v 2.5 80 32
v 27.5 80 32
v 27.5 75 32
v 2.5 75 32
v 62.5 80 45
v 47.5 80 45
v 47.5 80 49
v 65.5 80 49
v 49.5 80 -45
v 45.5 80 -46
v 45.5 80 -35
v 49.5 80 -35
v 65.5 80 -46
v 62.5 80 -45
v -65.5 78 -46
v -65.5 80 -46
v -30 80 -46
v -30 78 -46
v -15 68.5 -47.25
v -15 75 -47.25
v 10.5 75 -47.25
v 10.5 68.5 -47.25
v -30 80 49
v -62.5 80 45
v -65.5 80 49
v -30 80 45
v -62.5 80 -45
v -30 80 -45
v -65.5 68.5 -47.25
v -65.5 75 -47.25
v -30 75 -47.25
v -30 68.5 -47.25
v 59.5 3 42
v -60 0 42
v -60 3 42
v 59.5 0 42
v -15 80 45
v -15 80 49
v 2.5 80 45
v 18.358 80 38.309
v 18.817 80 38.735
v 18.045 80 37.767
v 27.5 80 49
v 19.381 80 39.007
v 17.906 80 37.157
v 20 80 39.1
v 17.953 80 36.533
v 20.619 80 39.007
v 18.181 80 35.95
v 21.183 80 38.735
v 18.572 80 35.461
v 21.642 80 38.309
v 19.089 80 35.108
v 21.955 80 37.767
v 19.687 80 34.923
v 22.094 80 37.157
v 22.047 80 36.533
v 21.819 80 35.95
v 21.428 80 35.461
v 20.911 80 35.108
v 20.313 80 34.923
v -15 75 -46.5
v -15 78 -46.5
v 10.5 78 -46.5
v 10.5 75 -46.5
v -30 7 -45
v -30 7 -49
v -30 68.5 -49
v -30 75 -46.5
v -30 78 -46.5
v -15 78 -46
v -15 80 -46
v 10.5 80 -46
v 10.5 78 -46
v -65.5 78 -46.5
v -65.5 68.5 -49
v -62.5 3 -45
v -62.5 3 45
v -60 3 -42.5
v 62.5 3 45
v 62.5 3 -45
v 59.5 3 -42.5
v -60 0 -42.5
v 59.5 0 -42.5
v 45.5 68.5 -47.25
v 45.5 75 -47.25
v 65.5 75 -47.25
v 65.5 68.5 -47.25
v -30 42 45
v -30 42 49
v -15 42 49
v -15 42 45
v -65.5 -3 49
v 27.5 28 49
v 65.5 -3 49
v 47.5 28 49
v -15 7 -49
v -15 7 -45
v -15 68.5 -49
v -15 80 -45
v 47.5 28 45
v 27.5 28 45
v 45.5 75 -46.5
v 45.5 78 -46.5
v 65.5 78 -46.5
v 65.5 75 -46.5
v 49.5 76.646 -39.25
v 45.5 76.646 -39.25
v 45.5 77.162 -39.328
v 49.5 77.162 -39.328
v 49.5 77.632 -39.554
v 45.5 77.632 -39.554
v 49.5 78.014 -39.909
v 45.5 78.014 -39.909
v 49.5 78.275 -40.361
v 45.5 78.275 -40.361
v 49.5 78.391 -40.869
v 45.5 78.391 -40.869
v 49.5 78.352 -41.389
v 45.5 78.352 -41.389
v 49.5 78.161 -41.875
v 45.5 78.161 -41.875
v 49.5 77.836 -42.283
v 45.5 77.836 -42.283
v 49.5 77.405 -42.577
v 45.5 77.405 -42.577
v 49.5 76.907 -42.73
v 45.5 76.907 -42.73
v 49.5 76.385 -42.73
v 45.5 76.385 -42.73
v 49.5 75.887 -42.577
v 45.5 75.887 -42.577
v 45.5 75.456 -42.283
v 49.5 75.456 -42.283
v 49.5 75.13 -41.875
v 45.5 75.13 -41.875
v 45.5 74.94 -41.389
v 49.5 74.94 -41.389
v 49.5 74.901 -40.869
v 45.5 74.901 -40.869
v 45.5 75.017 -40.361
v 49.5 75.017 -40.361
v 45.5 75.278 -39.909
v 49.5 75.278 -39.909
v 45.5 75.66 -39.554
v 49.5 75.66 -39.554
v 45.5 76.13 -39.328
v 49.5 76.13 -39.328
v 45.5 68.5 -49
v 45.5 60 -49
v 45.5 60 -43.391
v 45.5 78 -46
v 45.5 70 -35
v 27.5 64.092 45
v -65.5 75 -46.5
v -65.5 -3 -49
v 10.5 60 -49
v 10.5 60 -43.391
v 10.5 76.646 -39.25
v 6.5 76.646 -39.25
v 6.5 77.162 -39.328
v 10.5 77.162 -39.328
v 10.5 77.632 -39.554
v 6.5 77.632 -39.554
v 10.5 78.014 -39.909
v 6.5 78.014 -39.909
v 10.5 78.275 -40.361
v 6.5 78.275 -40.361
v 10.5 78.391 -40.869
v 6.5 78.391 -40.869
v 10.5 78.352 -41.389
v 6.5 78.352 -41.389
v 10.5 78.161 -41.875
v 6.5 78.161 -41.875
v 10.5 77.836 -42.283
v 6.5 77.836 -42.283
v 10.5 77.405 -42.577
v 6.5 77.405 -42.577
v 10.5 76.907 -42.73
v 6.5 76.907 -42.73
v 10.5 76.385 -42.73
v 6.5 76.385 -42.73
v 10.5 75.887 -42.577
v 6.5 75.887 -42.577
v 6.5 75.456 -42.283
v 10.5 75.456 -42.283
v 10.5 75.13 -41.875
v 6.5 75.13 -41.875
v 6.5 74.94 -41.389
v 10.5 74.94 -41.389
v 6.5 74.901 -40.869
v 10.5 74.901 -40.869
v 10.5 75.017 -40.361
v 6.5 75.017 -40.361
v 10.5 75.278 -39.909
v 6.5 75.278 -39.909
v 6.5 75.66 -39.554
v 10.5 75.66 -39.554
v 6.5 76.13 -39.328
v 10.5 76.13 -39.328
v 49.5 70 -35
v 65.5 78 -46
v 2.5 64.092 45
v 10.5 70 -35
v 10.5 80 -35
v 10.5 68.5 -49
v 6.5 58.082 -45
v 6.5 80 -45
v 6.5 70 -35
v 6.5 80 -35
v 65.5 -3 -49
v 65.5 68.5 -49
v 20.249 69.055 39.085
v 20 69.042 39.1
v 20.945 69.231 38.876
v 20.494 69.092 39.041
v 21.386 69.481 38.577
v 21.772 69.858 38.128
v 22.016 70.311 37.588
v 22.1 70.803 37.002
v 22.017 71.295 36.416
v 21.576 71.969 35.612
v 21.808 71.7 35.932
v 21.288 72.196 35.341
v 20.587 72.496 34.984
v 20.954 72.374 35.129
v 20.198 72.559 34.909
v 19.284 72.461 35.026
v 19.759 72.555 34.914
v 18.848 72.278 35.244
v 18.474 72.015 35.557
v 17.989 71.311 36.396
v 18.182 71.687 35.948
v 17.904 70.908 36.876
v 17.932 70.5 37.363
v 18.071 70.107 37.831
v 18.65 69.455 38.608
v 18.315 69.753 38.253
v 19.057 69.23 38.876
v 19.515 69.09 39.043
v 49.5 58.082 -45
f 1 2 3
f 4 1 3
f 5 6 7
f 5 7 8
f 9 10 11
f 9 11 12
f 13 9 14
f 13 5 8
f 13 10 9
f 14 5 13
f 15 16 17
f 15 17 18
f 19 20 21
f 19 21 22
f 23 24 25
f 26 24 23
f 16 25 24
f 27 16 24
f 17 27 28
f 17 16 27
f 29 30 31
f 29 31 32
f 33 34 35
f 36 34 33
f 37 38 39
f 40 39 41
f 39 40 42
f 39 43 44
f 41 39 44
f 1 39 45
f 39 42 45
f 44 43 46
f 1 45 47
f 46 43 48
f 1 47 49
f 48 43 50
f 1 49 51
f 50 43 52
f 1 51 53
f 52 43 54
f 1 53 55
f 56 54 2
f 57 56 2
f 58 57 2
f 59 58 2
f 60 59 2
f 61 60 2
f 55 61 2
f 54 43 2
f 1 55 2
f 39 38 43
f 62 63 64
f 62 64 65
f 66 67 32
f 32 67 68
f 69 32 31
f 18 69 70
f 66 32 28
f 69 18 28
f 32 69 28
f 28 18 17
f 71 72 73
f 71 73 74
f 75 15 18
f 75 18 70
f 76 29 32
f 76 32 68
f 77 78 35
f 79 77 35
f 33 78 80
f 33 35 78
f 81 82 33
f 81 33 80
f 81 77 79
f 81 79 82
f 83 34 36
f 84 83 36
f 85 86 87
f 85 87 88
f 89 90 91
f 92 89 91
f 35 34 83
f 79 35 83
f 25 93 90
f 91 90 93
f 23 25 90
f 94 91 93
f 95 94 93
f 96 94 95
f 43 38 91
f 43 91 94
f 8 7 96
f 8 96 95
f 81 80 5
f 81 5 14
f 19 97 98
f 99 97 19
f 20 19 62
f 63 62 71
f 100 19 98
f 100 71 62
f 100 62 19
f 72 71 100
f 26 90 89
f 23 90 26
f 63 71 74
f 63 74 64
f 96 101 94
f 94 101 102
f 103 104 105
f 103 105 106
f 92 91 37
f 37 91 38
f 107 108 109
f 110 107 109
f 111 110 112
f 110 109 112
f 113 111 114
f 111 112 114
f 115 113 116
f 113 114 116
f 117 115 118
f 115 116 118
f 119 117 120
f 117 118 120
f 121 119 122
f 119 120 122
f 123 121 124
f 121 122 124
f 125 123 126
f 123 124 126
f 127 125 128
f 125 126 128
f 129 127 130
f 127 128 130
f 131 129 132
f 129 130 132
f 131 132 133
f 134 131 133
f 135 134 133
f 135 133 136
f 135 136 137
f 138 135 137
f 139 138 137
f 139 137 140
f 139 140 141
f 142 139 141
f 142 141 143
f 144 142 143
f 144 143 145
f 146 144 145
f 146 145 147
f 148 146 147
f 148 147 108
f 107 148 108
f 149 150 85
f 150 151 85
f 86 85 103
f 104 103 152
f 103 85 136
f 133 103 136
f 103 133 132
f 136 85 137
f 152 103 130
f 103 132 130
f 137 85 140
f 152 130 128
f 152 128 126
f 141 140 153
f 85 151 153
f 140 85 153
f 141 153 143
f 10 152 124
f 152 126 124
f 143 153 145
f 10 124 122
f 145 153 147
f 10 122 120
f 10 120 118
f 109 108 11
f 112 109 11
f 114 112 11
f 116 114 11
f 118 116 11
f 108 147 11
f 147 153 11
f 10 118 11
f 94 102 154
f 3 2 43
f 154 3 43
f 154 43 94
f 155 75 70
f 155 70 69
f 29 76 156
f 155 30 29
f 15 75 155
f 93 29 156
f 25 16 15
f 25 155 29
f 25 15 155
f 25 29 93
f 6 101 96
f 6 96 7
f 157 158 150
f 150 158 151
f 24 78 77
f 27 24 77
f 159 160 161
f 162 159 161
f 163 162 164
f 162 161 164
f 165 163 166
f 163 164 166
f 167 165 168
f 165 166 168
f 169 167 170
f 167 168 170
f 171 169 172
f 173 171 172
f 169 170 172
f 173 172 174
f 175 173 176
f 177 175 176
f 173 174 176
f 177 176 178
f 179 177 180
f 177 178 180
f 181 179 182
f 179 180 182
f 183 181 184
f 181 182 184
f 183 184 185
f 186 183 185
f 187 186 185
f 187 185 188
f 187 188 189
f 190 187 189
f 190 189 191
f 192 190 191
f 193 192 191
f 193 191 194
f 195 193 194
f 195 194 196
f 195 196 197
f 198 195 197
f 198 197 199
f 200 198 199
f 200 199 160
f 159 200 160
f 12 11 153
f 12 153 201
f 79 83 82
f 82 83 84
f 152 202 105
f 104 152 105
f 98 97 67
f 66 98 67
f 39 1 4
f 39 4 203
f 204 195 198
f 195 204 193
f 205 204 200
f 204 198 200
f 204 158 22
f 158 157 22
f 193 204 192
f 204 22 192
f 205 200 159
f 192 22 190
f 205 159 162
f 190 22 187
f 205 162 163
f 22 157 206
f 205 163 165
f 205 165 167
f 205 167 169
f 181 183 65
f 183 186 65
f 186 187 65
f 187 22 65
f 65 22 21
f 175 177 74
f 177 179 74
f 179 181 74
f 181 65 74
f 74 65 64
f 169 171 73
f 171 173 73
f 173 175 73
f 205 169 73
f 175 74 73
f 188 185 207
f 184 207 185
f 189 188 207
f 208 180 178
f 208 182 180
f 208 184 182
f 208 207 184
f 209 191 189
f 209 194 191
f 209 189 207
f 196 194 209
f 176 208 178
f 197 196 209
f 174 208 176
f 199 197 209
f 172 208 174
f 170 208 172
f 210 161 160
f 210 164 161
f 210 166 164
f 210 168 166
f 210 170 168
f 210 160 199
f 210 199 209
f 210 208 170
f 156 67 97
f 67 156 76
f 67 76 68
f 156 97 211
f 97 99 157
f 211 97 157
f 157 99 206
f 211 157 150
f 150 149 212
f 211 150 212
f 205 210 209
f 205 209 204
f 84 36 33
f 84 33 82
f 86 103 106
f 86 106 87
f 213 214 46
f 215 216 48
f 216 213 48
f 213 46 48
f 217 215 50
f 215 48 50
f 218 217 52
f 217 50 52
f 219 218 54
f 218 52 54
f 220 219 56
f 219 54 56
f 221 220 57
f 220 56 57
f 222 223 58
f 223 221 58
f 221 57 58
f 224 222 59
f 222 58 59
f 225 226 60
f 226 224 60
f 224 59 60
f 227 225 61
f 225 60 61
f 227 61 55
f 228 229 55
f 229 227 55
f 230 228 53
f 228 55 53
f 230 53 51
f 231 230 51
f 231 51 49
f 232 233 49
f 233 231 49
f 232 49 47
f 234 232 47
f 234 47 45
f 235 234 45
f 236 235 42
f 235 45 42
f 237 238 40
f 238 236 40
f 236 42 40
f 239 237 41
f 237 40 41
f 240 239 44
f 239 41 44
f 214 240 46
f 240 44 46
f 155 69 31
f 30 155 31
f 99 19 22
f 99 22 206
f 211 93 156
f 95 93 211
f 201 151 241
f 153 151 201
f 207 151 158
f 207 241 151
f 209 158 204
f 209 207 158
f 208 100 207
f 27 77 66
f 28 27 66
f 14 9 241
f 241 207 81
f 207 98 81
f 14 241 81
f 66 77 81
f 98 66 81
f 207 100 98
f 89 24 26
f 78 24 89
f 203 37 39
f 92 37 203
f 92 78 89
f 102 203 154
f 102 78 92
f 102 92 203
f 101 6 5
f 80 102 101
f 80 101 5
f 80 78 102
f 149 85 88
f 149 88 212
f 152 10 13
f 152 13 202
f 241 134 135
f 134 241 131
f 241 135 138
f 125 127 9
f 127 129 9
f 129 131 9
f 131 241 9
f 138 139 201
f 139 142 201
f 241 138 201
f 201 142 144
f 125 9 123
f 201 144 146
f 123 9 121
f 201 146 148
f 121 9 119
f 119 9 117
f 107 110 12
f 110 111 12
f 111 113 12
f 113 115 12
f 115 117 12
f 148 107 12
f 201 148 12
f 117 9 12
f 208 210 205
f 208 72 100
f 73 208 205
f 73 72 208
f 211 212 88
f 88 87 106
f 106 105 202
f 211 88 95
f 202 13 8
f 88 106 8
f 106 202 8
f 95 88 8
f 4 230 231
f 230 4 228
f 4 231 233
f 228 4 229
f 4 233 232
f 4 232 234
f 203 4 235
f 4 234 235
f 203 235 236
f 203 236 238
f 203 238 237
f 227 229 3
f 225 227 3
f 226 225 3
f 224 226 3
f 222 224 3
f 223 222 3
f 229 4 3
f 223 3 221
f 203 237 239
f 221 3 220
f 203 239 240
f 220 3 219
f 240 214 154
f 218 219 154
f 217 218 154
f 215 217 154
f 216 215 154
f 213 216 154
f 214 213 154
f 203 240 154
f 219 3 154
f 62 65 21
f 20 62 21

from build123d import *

# Parameters (mm, degrees)
SKETCH1_W                       = 131
SKETCH1_H                       = 98
SKETCH1_W_2                     = 125
SKETCH1_H_2                     = 90
BOSS_EXTRUDE1_DEPTH             = 80
SKETCH2_W                       = 131
SKETCH2_H                       = 98
BOSS_EXTRUDE2_DEPTH             = 3
SKETCH4_W                       = 125
SKETCH4_H                       = 90
SKETCH4_W_2                     = 119.5
SKETCH4_H_2                     = 84.5
BOSS_EXTRUDE3_DEPTH             = 3
SKETCH5_W                       = 15
SKETCH5_H                       = 73
CABLE_CUT_TOP_DEPTH             = 4
CABLE_CUT_BOTTOM_RIGHT_REACH    = 141.736
SKETCH6_W                       = 20
SKETCH6_H                       = 52
SKETCH10_W                      = 15
SKETCH10_H                      = 38
CABLE_CUT_BOTTOM_LEFT_DEPTH     = 4
SCHANIER_CUT_REACH              = 141.736
SKETCH7_W                       = 35
SKETCH7_H                       = 20
SKETCH8_W                       = 4
SKETCH8_H                       = 10
SCHANIER_DEPTH                  = 10
F_3D_PRINTER_SUPPORT_DEPTH      = 43
SKIZZE3_W                       = 35
SKIZZE3_H                       = 10
SCHNITT_LINEAR_AUSTRAGEN1_DEPTH = 20
SCHNITT_LINEAR_AUSTRAGEN3_REACH = 120.258
SKIZZE5_R                       = 1.75
AUFSATZ_LINEAR_AUSTRAGEN2_DEPTH = 25
SCHNITT_LINEAR_AUSTRAGEN4_REACH = 118.534
SKIZZE10_R                      = 2.1
CUT_EXTRUDE4_REACH              = 163.127


with BuildPart() as part:
    # Sketch1 → Boss-Extrude1 (new body)
    with BuildSketch(Plane(origin=(0, 0, 0), x_dir=(1, 0, 0), z_dir=(0, 1, 0))):
        Rectangle(SKETCH1_W, SKETCH1_H)
        Rectangle(SKETCH1_W_2, SKETCH1_H_2, mode=Mode.SUBTRACT)
    extrude(amount=BOSS_EXTRUDE1_DEPTH)

    # Sketch2 → Boss-Extrude2 (add)
    with BuildSketch(Plane.XZ):
        Rectangle(SKETCH2_W, SKETCH2_H)
    extrude(amount=BOSS_EXTRUDE2_DEPTH)

    # Sketch4 → Boss-Extrude3 (add)
    with BuildSketch(Plane(origin=(0, 0, 0), x_dir=(1, 0, 0), z_dir=(0, 1, 0))):
        Rectangle(SKETCH4_W, SKETCH4_H)
        with Locations((-0.25, 0.25)):
            Rectangle(SKETCH4_W_2, SKETCH4_H_2, mode=Mode.SUBTRACT)
    extrude(amount=BOSS_EXTRUDE3_DEPTH)

    # Sketch5 → Cable Cut Top (cut)
    with BuildSketch(Plane(origin=(0, 0, -49), x_dir=(-1, 0, 0), z_dir=(0, 0, -1))):
        with Locations((22.5, 43.5)):
            Rectangle(SKETCH5_W, SKETCH5_H)
    extrude(amount=-CABLE_CUT_TOP_DEPTH, mode=Mode.SUBTRACT)

    # Sketch6 → Cable Cut Bottom Right (cut, up to next)
    with BuildSketch(Plane(origin=(0, 0, 45), x_dir=(-1, 0, 0), z_dir=(0, 0, -1)), mode=Mode.PRIVATE) as cable_cut_bottom_right_sk1:
        with Locations((-37.5, 54)):
            Rectangle(SKETCH6_W, SKETCH6_H)
    cable_cut_bottom_right_tool1 = extrude(cable_cut_bottom_right_sk1.sketch, amount=-CABLE_CUT_BOTTOM_RIGHT_REACH, mode=Mode.PRIVATE) & part.part
    add(cable_cut_bottom_right_tool1.solids().sort_by_distance((37.5, 54, 45))[0], mode=Mode.SUBTRACT)

    # Sketch10 → Cable Cut Bottom Left (cut)
    with BuildSketch(Plane.XY.offset(49)):
        with Locations((-22.5, 61)):
            Rectangle(SKETCH10_W, SKETCH10_H)
    extrude(amount=-CABLE_CUT_BOTTOM_LEFT_DEPTH, mode=Mode.SUBTRACT)

    # Sketch7 → Schanier Cut (cut, up to next)
    with BuildSketch(Plane.XY.offset(-45), mode=Mode.PRIVATE) as schanier_cut_sk1:
        with Locations((28, 70)):
            Rectangle(SKETCH7_W, SKETCH7_H)
    schanier_cut_tool1 = extrude(schanier_cut_sk1.sketch, amount=-SCHANIER_CUT_REACH, mode=Mode.PRIVATE) & part.part
    add(schanier_cut_tool1.solids().sort_by_distance((28, 70, -45))[0], mode=Mode.SUBTRACT)

    # Sketch8 → Schanier (add)
    with BuildSketch(Plane.XY.offset(-45)):
        with Locations((8.5, 75)):
            Rectangle(SKETCH8_W, SKETCH8_H)
        with Locations((47.5, 75)):
            Rectangle(SKETCH8_W, SKETCH8_H)
    extrude(amount=SCHANIER_DEPTH)

    # Skizze2 → 3D Printer Support (add)
    with BuildSketch(Plane.ZY.offset(-6.5)):
        Polygon((-35, 70), (-45, 70), (-45, 58.082464074), align=None)
    extrude(amount=-F_3D_PRINTER_SUPPORT_DEPTH)

    # Skizze3 → Schnitt-Linear austragen1 (cut)
    with BuildSketch(Plane(origin=(0, 0, -45), x_dir=(-1, 0, 0), z_dir=(0, 0, -1))):
        with Locations((-28, 65)):
            Rectangle(SKIZZE3_W, SKIZZE3_H)
    extrude(amount=-SCHNITT_LINEAR_AUSTRAGEN1_DEPTH, mode=Mode.SUBTRACT)

    # Schnitt-Linear austragen3: up to this face of the body (flat: up to its plane)
    schnitt_linear_austragen3_end = Plane(part.part.faces().sort_by_distance((49.5, 71.649796712, -40.622308687))[0])
    # Skizze5 → Schnitt-Linear austragen3 (cut, up to the picked face)
    with BuildSketch(Plane.ZY.offset(-6.5), mode=Mode.PRIVATE) as schnitt_linear_austragen3_sk1:
        with Locations((-41, 76.645898034)):
            Circle(SKIZZE5_R)
    schnitt_linear_austragen3_tool1 = split(extrude(schnitt_linear_austragen3_sk1.sketch, amount=-SCHNITT_LINEAR_AUSTRAGEN3_REACH, mode=Mode.PRIVATE), bisect_by=schnitt_linear_austragen3_end, keep=Keep.BOTH, mode=Mode.PRIVATE)
    add(schnitt_linear_austragen3_tool1.solids().sort_by(Axis((6.5, 76.645898, -41), (1, 0, 0)))[0], mode=Mode.SUBTRACT)

    # Skizze9 → Aufsatz-Linear austragen2 (add)
    with BuildSketch(Plane(origin=(27.5, 0, 0), x_dir=(0, 0, -1), z_dir=(1, 0, 0))):
        Polygon((-45, 80), (-32, 80), (-32, 75), (-45, 64.091704795), align=None)
    extrude(amount=-AUFSATZ_LINEAR_AUSTRAGEN2_DEPTH)

    # Schnitt-Linear austragen4: up to this plane
    schnitt_linear_austragen4_end = Plane(origin=(2.5, 75, 32), z_dir=(0, -0.766044443118974, -0.6427876096865441))
    # Skizze10 → Schnitt-Linear austragen4 (cut, up to the surface)
    with BuildSketch(Plane(origin=(0, 80, 0), x_dir=(1, 0, 0), z_dir=(0, 1, 0)), mode=Mode.PRIVATE) as schnitt_linear_austragen4_sk1:
        with Locations(Location((20, -37, 0), (0, 0, 270))):
            Circle(SKIZZE10_R)
    schnitt_linear_austragen4_tool1 = split(extrude(schnitt_linear_austragen4_sk1.sketch, amount=-SCHNITT_LINEAR_AUSTRAGEN4_REACH, mode=Mode.PRIVATE), bisect_by=schnitt_linear_austragen4_end, keep=Keep.BOTH, mode=Mode.PRIVATE)
    add(schnitt_linear_austragen4_tool1.solids().sort_by_distance((20, 80, 37))[0], mode=Mode.SUBTRACT)

    # Cut-Extrude4: up to this face of the body (flat: up to its plane)
    cut_extrude4_end = Plane(part.part.faces().sort_by_distance((65.5, 38.5, 0))[0])
    # Sketch9 → Cut-Extrude4 (cut, up to the picked face)
    with BuildSketch(Plane.ZY.offset(65.5), mode=Mode.PRIVATE) as cut_extrude4_sk1:
        Polygon((-46, 78), (-46.5, 78), (-46.5, 75), (-47.25, 75), (-47.25, 68.5), (-49, 68.5), (-49, 80), (-46, 80), align=None)
    cut_extrude4_tool1 = split(extrude(cut_extrude4_sk1.sketch, amount=-CUT_EXTRUDE4_REACH, mode=Mode.PRIVATE), bisect_by=cut_extrude4_end, keep=Keep.BOTH, mode=Mode.PRIVATE)
    add(cut_extrude4_tool1.solids().sort_by(Axis((-65.5, 74.930905, -47.861181), (1, 0, 0)))[0], mode=Mode.SUBTRACT)


solid = part.part
